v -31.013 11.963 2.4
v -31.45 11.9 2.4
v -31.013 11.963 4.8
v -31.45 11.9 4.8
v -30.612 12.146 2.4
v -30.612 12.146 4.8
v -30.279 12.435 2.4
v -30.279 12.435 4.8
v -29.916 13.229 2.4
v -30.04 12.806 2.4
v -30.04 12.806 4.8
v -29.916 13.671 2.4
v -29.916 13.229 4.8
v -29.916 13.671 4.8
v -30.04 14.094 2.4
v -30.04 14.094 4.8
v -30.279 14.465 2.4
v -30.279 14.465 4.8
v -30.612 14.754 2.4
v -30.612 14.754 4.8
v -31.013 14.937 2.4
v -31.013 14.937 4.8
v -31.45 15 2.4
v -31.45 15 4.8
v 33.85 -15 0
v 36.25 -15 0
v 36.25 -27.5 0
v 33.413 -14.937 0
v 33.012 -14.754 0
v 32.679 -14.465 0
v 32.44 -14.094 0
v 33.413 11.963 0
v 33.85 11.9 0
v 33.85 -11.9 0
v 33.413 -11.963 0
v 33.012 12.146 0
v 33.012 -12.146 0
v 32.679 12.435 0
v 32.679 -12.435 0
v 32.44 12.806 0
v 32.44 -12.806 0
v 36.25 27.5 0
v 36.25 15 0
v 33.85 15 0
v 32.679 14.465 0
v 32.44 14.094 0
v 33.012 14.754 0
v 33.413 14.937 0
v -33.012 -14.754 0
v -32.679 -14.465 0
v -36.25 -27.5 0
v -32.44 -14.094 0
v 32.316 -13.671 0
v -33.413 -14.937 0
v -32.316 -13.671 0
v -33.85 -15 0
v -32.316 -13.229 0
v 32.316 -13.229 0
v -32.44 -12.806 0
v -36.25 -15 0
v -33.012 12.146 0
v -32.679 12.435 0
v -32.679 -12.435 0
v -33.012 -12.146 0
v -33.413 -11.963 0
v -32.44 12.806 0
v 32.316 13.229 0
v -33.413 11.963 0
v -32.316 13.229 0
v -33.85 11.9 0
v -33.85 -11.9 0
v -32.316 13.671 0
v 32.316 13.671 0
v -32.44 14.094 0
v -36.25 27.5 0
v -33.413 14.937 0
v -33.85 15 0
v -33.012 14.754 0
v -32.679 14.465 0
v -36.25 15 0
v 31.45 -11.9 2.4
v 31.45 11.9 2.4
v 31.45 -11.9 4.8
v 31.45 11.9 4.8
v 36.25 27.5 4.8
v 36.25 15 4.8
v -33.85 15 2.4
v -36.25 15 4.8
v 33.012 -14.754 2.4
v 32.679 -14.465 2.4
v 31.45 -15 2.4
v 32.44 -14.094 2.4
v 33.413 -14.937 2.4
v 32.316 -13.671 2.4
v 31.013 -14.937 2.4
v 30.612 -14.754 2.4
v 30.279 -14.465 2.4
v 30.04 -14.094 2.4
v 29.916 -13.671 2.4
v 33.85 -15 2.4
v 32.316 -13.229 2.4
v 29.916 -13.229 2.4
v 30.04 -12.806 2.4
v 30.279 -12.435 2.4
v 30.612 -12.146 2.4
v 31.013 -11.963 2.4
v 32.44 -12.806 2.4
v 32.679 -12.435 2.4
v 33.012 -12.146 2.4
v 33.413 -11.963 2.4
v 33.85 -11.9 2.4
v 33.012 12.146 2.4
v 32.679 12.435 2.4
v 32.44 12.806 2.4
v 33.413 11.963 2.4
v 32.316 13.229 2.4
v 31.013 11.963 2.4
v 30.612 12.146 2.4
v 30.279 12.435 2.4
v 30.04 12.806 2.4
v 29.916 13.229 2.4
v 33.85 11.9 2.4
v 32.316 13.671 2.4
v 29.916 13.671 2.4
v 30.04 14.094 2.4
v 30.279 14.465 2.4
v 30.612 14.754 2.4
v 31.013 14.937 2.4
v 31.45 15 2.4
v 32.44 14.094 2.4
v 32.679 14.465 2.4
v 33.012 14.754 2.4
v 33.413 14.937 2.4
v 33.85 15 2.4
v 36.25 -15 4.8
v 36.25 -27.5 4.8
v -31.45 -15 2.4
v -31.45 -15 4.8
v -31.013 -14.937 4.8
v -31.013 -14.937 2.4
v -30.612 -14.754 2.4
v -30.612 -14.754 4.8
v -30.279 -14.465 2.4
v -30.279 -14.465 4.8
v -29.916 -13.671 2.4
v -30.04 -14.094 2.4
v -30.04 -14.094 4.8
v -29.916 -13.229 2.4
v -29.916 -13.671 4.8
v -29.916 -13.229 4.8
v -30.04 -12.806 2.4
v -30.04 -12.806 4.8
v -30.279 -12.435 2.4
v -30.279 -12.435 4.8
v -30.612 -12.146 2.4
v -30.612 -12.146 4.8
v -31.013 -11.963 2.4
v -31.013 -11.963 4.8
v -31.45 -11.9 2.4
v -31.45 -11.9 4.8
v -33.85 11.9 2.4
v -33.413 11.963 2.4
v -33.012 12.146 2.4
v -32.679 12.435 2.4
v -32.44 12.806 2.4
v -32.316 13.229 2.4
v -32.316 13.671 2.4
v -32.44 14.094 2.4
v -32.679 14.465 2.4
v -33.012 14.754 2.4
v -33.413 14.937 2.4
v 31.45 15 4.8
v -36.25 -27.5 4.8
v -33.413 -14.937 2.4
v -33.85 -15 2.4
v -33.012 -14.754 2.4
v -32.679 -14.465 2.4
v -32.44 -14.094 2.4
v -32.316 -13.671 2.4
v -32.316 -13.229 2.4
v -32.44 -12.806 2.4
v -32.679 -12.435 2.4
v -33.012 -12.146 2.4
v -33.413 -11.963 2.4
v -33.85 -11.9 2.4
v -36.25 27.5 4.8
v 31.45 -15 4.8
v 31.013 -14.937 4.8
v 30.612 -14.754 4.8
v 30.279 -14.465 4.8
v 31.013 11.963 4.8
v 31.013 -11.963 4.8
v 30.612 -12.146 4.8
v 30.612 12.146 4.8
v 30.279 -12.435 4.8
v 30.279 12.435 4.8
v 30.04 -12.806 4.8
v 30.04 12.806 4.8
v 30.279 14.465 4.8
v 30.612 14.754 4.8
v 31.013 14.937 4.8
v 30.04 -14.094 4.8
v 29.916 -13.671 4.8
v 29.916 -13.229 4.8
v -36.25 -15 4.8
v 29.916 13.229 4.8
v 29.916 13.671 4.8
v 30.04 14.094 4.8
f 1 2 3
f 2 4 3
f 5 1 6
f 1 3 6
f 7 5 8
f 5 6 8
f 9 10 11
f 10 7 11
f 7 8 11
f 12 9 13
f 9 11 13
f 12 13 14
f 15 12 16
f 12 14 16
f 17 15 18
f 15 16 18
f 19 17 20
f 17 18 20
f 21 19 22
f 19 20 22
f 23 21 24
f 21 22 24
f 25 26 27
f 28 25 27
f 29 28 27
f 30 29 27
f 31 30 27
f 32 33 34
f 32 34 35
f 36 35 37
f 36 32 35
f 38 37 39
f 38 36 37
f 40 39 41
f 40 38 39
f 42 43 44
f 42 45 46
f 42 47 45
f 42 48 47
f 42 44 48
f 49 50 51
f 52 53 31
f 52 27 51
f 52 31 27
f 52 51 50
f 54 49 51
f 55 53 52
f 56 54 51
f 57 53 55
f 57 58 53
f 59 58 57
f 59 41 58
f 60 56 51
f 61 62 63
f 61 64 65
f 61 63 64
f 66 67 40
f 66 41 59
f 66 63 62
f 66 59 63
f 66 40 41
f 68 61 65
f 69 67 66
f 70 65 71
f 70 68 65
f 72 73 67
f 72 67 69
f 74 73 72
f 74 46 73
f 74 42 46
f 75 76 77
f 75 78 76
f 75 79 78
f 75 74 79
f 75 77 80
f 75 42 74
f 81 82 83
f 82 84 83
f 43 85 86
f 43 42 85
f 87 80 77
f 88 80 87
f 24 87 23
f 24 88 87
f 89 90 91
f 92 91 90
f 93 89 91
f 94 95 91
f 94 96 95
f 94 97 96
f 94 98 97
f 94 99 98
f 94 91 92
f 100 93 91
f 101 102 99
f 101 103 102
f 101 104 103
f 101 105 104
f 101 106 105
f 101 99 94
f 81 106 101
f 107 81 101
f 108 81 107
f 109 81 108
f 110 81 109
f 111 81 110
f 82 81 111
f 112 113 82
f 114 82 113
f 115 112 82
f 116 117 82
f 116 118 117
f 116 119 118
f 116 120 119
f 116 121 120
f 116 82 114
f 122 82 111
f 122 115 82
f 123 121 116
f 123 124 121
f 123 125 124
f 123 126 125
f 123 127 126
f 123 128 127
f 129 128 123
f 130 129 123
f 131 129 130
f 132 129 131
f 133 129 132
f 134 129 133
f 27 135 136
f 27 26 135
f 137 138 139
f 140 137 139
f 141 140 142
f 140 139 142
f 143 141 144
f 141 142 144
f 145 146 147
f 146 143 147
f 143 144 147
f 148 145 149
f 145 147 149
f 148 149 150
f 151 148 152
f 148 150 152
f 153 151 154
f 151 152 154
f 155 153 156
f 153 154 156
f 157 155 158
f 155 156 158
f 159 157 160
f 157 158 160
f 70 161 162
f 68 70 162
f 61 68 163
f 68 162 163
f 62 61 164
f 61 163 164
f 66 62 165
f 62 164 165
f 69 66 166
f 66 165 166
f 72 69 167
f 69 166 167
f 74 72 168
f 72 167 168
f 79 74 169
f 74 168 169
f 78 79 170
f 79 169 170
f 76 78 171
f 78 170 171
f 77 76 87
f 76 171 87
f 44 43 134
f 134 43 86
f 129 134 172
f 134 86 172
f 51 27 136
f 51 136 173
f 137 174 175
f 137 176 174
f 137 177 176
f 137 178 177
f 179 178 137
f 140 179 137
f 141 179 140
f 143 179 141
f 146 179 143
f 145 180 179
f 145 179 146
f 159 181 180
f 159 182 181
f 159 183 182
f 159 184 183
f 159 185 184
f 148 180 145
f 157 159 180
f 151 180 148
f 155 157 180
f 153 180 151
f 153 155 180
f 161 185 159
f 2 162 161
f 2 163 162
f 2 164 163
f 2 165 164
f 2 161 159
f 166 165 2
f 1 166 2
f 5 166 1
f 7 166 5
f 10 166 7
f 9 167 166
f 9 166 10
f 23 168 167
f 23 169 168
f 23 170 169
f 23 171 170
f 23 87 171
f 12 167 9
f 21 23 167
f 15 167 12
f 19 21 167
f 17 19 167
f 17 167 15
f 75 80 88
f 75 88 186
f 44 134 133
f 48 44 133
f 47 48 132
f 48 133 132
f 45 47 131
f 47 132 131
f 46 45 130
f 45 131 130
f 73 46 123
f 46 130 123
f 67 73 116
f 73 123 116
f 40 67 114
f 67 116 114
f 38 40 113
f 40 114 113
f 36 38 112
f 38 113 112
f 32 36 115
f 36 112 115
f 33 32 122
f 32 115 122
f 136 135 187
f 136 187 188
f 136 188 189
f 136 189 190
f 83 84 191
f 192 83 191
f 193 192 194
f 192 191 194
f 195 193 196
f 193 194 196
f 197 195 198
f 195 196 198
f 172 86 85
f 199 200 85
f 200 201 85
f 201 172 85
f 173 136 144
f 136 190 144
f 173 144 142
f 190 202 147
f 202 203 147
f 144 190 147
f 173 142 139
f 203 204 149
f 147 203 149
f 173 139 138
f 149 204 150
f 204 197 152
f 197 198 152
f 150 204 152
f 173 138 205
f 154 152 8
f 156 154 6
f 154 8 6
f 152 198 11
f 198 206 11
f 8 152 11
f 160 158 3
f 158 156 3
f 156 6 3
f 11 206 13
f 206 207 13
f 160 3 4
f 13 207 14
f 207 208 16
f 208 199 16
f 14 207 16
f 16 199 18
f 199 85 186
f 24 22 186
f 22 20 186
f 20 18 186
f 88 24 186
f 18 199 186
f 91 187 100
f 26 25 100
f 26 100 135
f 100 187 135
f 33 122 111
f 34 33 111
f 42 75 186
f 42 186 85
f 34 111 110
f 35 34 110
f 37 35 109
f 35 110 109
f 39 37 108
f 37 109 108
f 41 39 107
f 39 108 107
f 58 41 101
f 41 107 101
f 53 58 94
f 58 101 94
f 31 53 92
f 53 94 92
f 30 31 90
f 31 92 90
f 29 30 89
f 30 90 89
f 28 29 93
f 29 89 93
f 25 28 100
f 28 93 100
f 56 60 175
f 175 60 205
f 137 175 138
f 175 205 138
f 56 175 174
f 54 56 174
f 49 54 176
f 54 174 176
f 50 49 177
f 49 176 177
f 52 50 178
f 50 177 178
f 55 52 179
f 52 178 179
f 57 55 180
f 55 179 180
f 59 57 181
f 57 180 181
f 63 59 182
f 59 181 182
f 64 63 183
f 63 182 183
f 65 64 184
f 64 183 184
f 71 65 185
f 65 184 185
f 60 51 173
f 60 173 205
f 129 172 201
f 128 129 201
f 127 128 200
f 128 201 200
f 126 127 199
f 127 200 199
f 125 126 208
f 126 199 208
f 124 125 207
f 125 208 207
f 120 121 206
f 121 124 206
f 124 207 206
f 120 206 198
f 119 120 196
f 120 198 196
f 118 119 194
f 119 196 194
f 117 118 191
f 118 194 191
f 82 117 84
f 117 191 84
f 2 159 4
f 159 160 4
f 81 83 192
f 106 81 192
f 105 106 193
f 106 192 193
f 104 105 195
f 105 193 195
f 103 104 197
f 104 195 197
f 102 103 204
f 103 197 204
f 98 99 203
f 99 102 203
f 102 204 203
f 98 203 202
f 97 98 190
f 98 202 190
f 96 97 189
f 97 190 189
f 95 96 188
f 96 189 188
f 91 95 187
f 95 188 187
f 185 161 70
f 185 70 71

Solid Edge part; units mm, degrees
sketch "Sketch1" plane through (0, 0, 0) normal (0, 0, 1) x (1, 0, 0)
  line L0 (-36.25, 27.5) -> (36.25, 27.5)
  line L1 (36.25, 27.5) -> (36.25, -27.5)
  line L2 (36.25, -27.5) -> (-36.25, -27.5)
  line L3 (-36.25, -27.5) -> (-36.25, 27.5)
extrude "ExtrudedProtrusion_7" add sketch "Sketch1" along normal blind 4.8
sketch "Sketch2" plane through (0, 0, 4.8) normal (0, 0, 1) x (1, 0, 0)
  line L0 (-33.85, -15) -> (-31.45, -15)
  line L1 (-31.45, -11.9) -> (-31.45, 11.9)
  line L2 (-33.85, 15) -> (-31.45, 15)
  line L3 (-33.85, 15) -> (-33.85, -15)
  arc A0 (-31.45, -11.9) -> (-31.45, -15) centre (-31.45, -13.45) cw
  arc A1 (-31.45, 15) -> (-31.45, 11.9) centre (-31.45, 13.45) cw
  line L4 (31.45, -15) -> (33.85, -15)
  line L5 (33.85, -15) -> (33.85, 15)
  line L6 (33.85, 15) -> (31.45, 15)
  line L7 (31.45, 11.9) -> (31.45, -11.9)
  arc A2 (31.45, 11.9) -> (31.45, 15) centre (31.45, 13.45) cw
  arc A3 (31.45, -15) -> (31.45, -11.9) centre (31.45, -13.45) cw
extrude "ExtrudedCutout_13" cut sketch "Sketch2" against normal blind 2.4
sketch "Sketch3" plane through (0, 0, 4.8) normal (0, 0, 1) x (1, 0, 0)
  line L0 (-33.85, 11.9) -> (-33.85, -11.9)
  line L1 (-36.25, -15) -> (-33.85, -15)
  line L2 (-36.25, 15) -> (-36.25, -15)
  line L3 (-36.25, 15) -> (-33.85, 15)
  arc A0 (-33.85, 15) -> (-33.85, 11.9) centre (-33.85, 13.45) cw
  arc A1 (-33.85, -11.9) -> (-33.85, -15) centre (-33.85, -13.45) cw
  line L4 (36.25, 15) -> (33.85, 15)
  line L5 (36.25, -15) -> (36.25, 15)
  line L6 (33.85, -15) -> (36.25, -15)
  line L7 (33.85, 11.9) -> (33.85, -11.9)
  arc A2 (33.85, 11.9) -> (33.85, 15) centre (33.85, 13.45) cw
  arc A3 (33.85, -15) -> (33.85, -11.9) centre (33.85, -13.45) cw
extrude "ExtrudedCutout_14" cut sketch "Sketch3" against normal blind 4.8
properties material "Polycarbonate"
